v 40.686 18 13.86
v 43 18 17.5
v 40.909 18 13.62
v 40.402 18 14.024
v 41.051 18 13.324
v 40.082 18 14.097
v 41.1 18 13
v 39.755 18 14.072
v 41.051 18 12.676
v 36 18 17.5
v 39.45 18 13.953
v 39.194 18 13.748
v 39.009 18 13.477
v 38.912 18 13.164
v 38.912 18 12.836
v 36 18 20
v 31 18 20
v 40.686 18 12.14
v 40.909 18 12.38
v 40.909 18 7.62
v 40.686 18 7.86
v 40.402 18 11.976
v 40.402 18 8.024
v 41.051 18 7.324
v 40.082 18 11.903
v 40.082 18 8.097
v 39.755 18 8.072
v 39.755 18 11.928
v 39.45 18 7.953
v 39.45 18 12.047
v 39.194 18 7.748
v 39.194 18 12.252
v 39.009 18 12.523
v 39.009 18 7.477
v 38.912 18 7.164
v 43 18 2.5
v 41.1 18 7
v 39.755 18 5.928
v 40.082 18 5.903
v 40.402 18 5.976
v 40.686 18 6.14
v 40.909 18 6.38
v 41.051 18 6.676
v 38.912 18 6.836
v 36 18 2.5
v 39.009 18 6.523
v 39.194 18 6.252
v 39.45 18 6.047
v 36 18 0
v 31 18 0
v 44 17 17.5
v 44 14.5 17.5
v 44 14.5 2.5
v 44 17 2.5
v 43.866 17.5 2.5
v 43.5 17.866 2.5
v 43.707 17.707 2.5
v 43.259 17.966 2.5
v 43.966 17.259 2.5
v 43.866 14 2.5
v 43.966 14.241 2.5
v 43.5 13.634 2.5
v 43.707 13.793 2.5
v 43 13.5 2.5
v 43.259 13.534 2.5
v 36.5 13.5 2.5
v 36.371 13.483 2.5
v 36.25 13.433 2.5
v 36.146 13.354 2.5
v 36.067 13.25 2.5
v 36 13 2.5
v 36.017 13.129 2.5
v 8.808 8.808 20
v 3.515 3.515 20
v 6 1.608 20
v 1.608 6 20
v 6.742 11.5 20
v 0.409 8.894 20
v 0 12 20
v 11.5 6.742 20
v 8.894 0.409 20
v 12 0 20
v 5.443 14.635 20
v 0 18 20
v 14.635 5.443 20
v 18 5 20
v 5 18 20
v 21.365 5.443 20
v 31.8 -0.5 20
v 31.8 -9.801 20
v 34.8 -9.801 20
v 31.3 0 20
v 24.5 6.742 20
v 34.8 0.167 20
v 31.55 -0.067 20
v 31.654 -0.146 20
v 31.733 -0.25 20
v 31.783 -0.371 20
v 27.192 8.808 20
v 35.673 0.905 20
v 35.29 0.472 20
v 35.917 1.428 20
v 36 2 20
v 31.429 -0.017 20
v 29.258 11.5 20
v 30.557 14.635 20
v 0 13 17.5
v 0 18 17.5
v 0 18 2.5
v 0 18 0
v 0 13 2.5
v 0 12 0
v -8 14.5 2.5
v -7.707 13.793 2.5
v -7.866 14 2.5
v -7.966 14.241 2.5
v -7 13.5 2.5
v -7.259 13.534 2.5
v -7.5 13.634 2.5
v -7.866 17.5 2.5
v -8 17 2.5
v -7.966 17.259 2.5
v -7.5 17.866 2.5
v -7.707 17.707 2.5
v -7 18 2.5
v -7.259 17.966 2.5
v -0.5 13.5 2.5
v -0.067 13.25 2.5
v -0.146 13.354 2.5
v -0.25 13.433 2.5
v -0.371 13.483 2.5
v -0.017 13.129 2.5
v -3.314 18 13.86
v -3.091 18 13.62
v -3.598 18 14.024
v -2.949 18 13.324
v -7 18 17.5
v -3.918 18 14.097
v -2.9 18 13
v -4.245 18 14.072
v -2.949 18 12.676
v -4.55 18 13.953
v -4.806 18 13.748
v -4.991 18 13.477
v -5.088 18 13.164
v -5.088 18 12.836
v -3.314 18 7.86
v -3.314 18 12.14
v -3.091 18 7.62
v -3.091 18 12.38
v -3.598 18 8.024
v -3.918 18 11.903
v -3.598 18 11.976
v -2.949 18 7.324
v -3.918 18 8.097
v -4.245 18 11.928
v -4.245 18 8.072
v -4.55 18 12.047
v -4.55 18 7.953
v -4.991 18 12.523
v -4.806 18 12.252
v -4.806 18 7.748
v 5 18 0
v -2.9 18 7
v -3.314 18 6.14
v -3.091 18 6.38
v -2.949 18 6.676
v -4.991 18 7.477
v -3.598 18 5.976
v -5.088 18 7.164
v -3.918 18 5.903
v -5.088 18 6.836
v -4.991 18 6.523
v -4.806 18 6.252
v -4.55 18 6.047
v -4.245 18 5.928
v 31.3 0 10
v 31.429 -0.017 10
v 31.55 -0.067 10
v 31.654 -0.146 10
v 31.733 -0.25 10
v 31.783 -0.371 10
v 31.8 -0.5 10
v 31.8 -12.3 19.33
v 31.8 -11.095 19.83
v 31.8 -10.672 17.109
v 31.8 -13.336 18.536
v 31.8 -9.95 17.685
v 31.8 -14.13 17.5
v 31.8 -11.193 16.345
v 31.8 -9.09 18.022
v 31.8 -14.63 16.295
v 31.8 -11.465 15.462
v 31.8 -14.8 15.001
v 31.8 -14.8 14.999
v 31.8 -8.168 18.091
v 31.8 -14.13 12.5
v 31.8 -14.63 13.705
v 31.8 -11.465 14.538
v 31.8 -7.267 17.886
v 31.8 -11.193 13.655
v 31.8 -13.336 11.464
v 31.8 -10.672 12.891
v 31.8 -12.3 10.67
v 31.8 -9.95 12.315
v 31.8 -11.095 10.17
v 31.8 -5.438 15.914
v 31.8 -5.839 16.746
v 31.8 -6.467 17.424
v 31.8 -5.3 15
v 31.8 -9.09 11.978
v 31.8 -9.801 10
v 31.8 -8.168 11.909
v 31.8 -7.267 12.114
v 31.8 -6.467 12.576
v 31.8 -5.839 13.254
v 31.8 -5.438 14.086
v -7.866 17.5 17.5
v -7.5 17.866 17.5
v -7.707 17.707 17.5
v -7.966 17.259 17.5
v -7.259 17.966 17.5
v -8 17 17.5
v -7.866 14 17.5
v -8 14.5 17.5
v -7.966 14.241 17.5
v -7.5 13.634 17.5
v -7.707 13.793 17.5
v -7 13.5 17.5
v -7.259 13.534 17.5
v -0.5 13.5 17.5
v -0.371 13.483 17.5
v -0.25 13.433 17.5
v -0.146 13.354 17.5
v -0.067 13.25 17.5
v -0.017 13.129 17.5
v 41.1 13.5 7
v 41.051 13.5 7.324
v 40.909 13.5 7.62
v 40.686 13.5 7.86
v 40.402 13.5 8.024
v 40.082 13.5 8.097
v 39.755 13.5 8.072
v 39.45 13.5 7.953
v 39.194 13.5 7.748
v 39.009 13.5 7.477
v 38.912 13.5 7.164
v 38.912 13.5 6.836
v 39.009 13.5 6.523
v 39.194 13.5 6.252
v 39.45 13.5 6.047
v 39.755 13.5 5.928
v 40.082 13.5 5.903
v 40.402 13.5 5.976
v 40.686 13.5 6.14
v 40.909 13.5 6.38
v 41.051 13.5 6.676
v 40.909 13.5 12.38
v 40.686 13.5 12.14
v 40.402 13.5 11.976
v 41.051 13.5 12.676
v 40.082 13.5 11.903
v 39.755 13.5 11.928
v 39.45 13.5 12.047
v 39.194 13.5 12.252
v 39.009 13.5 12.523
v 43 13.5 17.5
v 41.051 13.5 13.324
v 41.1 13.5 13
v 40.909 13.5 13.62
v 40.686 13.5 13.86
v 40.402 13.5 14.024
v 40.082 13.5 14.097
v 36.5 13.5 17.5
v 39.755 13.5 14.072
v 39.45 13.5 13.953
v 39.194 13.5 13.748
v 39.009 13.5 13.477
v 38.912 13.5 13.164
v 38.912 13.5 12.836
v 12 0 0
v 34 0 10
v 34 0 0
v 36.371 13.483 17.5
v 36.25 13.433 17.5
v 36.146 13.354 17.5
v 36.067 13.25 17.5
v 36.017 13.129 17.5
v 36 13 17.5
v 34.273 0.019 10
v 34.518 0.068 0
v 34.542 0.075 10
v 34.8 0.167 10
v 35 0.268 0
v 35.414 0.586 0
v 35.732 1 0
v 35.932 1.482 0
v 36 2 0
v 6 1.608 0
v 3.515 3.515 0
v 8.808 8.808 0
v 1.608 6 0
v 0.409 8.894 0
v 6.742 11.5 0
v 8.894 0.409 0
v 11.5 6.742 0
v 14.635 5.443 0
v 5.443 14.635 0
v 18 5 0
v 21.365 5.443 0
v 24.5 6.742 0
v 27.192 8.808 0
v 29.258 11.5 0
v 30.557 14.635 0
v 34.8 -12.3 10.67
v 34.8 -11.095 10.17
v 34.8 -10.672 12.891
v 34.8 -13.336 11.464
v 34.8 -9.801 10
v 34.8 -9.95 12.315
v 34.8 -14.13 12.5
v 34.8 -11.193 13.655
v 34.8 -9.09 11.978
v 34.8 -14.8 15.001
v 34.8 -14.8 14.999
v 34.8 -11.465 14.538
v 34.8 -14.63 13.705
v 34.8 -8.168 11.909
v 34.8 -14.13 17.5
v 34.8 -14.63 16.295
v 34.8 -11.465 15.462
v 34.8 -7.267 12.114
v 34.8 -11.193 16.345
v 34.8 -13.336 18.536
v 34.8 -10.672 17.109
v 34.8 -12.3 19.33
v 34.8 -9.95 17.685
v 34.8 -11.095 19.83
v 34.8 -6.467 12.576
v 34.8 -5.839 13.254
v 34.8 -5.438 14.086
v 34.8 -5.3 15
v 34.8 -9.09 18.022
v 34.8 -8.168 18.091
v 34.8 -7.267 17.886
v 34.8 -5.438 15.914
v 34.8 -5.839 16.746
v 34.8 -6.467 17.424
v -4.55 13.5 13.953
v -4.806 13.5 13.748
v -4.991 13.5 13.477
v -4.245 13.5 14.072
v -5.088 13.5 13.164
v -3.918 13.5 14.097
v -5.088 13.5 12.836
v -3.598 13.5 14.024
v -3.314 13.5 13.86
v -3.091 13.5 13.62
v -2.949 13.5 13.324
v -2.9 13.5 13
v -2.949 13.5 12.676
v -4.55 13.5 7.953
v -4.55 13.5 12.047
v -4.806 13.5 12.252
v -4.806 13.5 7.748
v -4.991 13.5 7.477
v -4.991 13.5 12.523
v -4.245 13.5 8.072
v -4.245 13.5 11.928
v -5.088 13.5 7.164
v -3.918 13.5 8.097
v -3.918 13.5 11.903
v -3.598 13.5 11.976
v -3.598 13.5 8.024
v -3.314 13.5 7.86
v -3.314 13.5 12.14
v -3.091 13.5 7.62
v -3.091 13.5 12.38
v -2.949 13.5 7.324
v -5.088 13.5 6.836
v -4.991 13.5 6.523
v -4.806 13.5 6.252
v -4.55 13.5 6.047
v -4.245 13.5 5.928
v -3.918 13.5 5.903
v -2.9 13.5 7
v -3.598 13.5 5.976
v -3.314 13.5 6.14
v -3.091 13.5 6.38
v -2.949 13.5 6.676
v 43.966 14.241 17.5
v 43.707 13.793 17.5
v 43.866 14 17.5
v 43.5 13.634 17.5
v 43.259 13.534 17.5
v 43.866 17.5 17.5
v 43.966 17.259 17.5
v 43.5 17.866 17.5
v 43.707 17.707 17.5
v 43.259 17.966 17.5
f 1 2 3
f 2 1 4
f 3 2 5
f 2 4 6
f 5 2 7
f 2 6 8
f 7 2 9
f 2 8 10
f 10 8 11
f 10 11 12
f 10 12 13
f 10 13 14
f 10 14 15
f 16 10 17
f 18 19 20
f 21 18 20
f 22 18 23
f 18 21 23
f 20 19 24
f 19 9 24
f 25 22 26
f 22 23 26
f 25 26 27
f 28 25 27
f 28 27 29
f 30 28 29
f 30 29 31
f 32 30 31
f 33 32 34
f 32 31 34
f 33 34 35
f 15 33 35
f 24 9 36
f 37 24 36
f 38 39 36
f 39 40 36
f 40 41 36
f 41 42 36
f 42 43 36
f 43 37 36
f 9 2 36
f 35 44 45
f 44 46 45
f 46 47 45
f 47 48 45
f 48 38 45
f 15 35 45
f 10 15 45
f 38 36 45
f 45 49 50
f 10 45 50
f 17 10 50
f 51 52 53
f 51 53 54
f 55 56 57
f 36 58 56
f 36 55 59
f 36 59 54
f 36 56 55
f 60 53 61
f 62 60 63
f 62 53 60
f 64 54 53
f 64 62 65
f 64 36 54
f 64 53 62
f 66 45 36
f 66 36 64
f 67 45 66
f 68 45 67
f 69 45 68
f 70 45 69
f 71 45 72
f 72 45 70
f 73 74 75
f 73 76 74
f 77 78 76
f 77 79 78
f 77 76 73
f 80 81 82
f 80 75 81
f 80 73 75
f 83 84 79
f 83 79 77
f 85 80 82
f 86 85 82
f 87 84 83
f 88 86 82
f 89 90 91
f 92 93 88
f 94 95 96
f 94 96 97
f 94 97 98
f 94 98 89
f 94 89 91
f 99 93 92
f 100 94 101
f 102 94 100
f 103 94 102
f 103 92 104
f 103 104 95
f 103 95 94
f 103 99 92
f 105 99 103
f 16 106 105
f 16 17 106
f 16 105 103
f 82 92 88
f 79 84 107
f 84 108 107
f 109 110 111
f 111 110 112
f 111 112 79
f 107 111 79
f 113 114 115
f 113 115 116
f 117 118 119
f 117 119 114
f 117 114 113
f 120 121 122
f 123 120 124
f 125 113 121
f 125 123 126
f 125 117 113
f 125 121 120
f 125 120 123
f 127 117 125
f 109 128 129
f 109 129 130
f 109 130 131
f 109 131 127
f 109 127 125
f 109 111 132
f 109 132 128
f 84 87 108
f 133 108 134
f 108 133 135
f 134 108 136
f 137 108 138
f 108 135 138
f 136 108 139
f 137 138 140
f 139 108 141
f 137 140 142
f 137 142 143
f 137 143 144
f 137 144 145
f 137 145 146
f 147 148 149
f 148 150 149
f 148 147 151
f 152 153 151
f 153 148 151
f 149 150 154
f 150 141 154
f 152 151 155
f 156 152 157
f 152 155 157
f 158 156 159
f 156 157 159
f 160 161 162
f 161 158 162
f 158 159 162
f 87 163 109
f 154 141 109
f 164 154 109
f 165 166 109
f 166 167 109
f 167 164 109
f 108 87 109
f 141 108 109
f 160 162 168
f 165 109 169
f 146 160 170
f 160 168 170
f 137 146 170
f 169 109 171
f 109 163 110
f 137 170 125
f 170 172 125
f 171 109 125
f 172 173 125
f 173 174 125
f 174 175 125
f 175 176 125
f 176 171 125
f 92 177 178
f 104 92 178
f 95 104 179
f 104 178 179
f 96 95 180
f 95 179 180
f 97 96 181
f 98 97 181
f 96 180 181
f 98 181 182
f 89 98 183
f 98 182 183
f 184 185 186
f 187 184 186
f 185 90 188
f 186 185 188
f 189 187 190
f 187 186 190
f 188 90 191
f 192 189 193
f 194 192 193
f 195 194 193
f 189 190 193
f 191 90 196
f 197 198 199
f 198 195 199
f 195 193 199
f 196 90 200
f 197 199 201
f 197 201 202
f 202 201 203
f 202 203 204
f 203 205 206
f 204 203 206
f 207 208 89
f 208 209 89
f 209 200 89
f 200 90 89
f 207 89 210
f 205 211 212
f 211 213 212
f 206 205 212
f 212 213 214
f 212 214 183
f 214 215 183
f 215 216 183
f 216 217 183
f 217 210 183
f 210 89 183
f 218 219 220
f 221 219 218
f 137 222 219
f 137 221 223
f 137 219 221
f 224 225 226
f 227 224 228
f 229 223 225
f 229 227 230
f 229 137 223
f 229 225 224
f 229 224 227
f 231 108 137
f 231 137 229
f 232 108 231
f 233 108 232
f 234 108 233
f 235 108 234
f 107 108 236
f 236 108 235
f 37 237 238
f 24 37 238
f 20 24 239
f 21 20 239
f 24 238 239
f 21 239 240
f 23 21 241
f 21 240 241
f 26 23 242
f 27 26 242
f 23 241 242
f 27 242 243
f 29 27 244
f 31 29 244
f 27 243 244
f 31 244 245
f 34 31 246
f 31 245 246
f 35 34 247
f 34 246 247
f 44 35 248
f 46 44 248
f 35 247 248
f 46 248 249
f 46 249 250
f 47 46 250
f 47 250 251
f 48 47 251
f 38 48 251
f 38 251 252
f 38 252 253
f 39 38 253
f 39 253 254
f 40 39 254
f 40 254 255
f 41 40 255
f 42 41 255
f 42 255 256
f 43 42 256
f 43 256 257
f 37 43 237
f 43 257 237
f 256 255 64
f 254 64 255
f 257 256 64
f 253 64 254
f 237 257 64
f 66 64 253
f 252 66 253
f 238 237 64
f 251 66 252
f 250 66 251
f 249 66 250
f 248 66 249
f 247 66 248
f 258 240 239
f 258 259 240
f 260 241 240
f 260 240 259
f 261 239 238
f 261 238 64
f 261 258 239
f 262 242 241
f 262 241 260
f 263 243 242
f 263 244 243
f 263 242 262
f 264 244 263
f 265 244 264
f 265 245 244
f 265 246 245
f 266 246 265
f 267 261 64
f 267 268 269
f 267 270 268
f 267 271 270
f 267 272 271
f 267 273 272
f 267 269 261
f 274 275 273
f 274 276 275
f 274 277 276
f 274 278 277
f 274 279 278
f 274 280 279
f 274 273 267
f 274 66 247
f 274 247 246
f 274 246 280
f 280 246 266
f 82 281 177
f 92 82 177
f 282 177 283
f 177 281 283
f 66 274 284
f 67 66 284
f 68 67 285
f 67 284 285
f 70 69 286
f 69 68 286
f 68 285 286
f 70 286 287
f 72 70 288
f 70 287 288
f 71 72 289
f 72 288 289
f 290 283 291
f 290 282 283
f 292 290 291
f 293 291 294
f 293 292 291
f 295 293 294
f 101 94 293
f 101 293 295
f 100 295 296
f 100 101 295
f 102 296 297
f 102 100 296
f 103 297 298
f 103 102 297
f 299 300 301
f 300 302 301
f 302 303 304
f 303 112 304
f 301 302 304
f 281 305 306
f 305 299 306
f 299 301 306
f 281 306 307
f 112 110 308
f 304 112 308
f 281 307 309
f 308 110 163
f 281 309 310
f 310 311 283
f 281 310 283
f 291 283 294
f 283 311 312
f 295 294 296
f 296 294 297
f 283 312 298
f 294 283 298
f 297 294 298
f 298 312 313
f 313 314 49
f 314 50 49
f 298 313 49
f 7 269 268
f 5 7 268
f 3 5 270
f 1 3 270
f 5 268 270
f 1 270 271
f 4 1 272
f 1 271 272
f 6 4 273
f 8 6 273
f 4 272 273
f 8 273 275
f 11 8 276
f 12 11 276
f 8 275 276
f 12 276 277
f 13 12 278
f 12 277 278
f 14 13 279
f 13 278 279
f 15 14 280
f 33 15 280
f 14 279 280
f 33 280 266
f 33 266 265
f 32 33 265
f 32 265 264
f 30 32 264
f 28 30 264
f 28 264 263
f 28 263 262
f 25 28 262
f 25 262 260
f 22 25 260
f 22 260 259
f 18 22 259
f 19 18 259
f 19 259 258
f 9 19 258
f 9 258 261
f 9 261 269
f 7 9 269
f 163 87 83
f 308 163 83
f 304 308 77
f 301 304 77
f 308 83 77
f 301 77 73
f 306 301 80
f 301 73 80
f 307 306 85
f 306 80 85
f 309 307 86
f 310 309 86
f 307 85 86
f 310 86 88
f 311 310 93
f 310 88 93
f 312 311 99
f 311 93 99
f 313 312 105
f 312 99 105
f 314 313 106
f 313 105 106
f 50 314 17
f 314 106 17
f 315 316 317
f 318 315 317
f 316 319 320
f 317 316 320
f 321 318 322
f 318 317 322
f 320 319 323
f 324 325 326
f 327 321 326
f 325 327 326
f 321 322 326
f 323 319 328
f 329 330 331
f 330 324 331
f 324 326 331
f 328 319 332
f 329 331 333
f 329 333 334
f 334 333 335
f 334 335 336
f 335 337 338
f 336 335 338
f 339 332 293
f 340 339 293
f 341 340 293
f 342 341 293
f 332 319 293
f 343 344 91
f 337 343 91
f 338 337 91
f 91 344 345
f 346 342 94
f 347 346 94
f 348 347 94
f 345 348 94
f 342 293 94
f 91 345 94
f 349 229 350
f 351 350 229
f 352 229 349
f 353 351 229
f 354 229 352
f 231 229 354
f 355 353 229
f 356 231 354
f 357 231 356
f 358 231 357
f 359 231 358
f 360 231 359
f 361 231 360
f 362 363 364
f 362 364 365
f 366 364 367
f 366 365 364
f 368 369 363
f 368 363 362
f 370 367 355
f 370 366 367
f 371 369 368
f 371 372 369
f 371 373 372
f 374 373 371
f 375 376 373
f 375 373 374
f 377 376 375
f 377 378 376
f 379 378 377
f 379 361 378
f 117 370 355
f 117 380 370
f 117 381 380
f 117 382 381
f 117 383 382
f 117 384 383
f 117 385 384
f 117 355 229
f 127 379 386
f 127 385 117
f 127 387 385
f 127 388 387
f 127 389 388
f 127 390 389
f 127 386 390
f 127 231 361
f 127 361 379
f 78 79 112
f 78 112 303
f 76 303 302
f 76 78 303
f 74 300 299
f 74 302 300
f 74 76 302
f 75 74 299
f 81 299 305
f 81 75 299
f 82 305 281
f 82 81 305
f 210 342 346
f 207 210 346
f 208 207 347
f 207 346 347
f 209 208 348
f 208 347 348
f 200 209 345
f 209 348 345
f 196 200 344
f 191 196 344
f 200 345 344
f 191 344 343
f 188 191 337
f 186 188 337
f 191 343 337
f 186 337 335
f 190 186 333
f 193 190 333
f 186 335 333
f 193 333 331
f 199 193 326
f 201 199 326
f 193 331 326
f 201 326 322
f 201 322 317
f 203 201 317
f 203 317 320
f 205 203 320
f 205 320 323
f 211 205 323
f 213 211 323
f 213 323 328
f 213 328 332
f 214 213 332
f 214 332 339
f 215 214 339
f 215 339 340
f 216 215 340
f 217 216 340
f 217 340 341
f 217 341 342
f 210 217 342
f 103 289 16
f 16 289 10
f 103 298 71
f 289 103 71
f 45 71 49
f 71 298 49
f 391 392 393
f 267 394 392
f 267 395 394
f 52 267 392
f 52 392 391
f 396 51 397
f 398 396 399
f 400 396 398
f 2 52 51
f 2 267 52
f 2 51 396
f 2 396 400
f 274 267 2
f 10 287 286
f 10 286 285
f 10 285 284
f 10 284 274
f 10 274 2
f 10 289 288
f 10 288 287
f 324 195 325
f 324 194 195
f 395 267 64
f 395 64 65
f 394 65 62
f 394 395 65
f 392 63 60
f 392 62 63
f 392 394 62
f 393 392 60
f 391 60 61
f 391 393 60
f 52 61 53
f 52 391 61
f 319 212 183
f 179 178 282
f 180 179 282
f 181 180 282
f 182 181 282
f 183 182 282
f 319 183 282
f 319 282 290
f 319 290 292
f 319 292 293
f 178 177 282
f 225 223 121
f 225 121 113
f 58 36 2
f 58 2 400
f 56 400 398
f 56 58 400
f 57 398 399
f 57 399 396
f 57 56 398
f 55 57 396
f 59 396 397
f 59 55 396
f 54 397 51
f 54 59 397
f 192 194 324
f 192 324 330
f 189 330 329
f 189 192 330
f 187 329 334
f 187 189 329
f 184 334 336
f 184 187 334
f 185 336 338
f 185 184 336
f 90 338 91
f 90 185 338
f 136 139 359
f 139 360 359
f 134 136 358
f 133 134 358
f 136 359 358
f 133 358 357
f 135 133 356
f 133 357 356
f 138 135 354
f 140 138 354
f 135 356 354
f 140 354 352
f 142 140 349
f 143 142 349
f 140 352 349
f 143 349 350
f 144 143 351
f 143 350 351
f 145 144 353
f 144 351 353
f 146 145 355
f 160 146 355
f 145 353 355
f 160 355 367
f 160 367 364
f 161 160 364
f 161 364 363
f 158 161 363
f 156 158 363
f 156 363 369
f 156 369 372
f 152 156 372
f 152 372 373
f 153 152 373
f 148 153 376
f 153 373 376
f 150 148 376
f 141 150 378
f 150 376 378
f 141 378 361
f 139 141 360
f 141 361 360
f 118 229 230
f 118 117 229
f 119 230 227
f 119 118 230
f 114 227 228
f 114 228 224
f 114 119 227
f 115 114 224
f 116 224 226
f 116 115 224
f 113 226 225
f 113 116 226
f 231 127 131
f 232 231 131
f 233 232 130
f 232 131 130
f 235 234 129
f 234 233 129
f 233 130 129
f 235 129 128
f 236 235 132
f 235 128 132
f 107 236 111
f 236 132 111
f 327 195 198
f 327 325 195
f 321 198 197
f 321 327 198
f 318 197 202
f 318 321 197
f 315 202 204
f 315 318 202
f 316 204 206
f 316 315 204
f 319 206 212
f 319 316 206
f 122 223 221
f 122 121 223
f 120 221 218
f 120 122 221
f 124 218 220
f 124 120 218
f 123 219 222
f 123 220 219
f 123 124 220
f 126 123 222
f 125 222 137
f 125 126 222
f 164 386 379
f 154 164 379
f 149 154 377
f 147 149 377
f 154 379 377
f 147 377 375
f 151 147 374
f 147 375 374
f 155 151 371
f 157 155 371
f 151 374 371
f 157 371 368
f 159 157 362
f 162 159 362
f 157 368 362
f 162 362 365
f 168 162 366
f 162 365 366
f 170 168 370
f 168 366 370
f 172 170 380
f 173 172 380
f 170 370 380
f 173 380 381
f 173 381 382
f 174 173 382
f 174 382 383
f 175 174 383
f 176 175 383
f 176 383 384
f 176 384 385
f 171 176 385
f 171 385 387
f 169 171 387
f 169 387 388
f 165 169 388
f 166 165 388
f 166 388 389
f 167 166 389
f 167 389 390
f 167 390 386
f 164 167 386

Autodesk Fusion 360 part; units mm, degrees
sketch "Sketch1" plane through (0, 0, 0) normal (0, 0, 1) x (1, 0, 0)
  line L0 (0, 0) -> (36, 0)
  line L1 (36, 0) -> (36, 18)
  line L2 (36, 18) -> (0, 18)
  line L3 (0, 18) -> (0, 0)
  dimension "d1" = 36
  dimension "d2" = 18
extrude "Extrude1" add sketch "Sketch1" along normal blind 20
sketch "Sketch2" plane through (0, 0, 20) normal (0, 0, 1) x (-1, 0, 0)
  line L0 (0, -18) -> (0, 0)
  line L1 (0, 0) -> (-36, 0)
  line L2 (-36, 0) -> (-36, -18)
  line L3 (-36, -18) -> (0, -18)
  circle A0 centre (-18, -18) radius 13
  dimension "d5" = 26
extrude "Extrude2" cut sketch "Sketch2" against normal blind 20 contours L3 A0 picked at (-19.0768, -11.2377)
ref_plane "WorkPlane1" through (0, 20, 0) normal (0, 1, 0) x (0, 0, 1)
sketch "Sketch7" plane through (0, 0, 0) normal (0, -1, 0) x (1, 0, 0)
  line L0 (0, 0) -> (36, 0)
  line L1 (36, 20) -> (0, 20)
  line L2 (0, 20) -> (0, 0)
  line L3 (18, 10) -> (18, 23) construction
  line L4 (36, 0) -> (36, 20)
sketch "Sketch6" plane through (36, 0, 0) normal (1, 0, 0) x (0, 1, 0)
  line L0 (0, 0) -> (18, 0)
  line L1 (18, 0) -> (18, 20)
  line L2 (18, 20) -> (0, 20)
  line L3 (0, 20) -> (0, 0)
  line L4 (0, 20) -> (18, 0) construction
  line L5 (0, 0) -> (18, 20) construction
  line L6 (9, 10) -> (18, 10) construction
  line L7 (9, 10) -> (9, 0) construction
  line L8 (9, 10) -> (9, 20) construction
  line L9 (13.5, 17.5) -> (18, 17.5) construction
  line L10 (13.5, 5) -> (13.5, 10) construction
  line L11 (18, 7.5) -> (18, 12.5311)
  line L12 (13.5, 17.5) -> (18, 17.5)
  line L13 (18, 17.5) -> (18, 2.5)
  line L14 (18, 2.5) -> (13.5, 2.5)
  line L15 (13.5, 2.5) -> (13.5, 17.5)
  dimension "d25" = 15
  dimension "d26" = 4.5
  dimension "d34" = 7.5
extrude "Extrude7" add sketch "Sketch6" along normal blind 8 contours L1 L11 L12 L13 L14 L15
sketch "Sketch11" plane through (0, 13.5, 0) normal (0, -1, 0) x (1, 0, 0)
  line L0 (36, 17.5) -> (36, 2.5)
  line L1 (36, 2.5) -> (44, 2.5)
  line L2 (44, 2.5) -> (44, 17.5)
  line L3 (44, 17.5) -> (36, 17.5)
  circle A0 centre (40, 13) radius 1.1
  circle A1 centre (40, 7) radius 1.1
  line L4 (36, 0) -> (36, 20)
  line L5 (36, 20) -> (0, 20)
  line L6 (18, 10) -> (18, 23)
  circle A2 centre (-4, 13) radius 1.1
  circle A3 centre (-4, 7) radius 1.1
  dimension "d30" = 2.2
  dimension "d31" = 2.2
  dimension "d35" = 6
  dimension "d36" = 4
  dimension "d37" = 4
  dimension "d38" = 7
sketch "Sketch12" plane through (0, 0, 0) normal (-1, 0, 0) x (0, -1, 0)
  line L0 (-18, 0) -> (0, 0)
  line L1 (0, 0) -> (0, 20)
  line L2 (0, 20) -> (-18, 20)
  line L3 (-18, 20) -> (-18, 0)
  line L4 (-18, 17.5) -> (-13.5, 17.5)
  line L5 (-13.5, 17.5) -> (-13.5, 2.5)
  line L6 (-13.5, 2.5) -> (-18, 2.5)
  line L7 (-18, 2.5) -> (-18, 17.5)
  line L8 (-18, 10) -> (-8, 10) construction
  dimension "d39" = 15
  dimension "d40" = 7.5
  dimension "d41" = 4.5
extrude "Extrude8" add sketch "Sketch12" along normal blind 8 contours L3 L4 L5 L6 L7
extrude "Extrude9" cut sketch "Sketch11" against normal blind 4.5 contours A0 | A1 | A2 | A3
sketch "Sketch13" plane through (0, 0, 20) normal (0, 0, 1) x (-1, 0, 0)
  arc A0 (-5, -18) -> (-31, -18) centre (-18, -18) ccw
  line L0 (-5, -18) -> (0, -18)
  line L1 (0, -18) -> (0, 0)
  line L2 (0, 0) -> (-36, 0)
  line L3 (-36, 0) -> (-36, -18)
  line L4 (-36, -18) -> (-31, -18)
  line L5 (-34.8, -18) -> (-34.8, 0) construction
  dimension "d46" = 3.8
sketch "Sketch14" plane through (18, 0, 10) normal (0, -1, 0) x (1, 0, 0)
  line L0 (16.8, 10) -> (13.8, 10)
  line L1 (13.8, 10) -> (13.8, 0)
  line L2 (13.8, 0) -> (16.8, 0)
  line L3 (16.8, 0) -> (16.8, 10)
  point P0 (16.8, 10)
  dimension "d47" = 3
  dimension "d48" = 10
extrude "Extrude10" add sketch "Sketch14" along normal blind 14.8
sketch "Sketch15" plane through (34.8, 0, 0) normal (1, 0, 0) x (0, 1, 0)
  line L0 (0, 10) -> (0, 20)
  line L1 (0, 20) -> (-14.8, 20)
  line L2 (-14.8, 20) -> (-14.8, 10)
  line L3 (-14.8, 10) -> (0, 10)
  circle A0 centre (-8.4, 15) radius 3.1
  dimension "d51" = 6.2
  dimension "d52" = 6.4
  dimension "d53" = 5
extrude "Extrude11" cut sketch "Sketch15" against normal blind 3 contours A0
fillet "Fillet1" radius 5 2 edges at (33.3, -14.8, 20) (33.3, -14.8, 10)
fillet "Fillet2" radius 2 1 edges at (36, 0, 10)
fillet "Fillet3" radius 12 1 edges at (0, 0, 10)
fillet "Fillet4" radius 0.5 1 edges at (0, 13.5, 10)
fillet "Fillet5" radius 1 2 edges at (-8, 18, 10) (-8, 13.5, 10)
fillet "Fillet6" radius 1 2 edges at (44, 13.5, 10) (44, 18, 10)
fillet "Fillet7" radius 0.5 1 edges at (36, 13.5, 10)
fillet "Fillet8" radius 0.5 1 edges at (31.8, 0, 15)
